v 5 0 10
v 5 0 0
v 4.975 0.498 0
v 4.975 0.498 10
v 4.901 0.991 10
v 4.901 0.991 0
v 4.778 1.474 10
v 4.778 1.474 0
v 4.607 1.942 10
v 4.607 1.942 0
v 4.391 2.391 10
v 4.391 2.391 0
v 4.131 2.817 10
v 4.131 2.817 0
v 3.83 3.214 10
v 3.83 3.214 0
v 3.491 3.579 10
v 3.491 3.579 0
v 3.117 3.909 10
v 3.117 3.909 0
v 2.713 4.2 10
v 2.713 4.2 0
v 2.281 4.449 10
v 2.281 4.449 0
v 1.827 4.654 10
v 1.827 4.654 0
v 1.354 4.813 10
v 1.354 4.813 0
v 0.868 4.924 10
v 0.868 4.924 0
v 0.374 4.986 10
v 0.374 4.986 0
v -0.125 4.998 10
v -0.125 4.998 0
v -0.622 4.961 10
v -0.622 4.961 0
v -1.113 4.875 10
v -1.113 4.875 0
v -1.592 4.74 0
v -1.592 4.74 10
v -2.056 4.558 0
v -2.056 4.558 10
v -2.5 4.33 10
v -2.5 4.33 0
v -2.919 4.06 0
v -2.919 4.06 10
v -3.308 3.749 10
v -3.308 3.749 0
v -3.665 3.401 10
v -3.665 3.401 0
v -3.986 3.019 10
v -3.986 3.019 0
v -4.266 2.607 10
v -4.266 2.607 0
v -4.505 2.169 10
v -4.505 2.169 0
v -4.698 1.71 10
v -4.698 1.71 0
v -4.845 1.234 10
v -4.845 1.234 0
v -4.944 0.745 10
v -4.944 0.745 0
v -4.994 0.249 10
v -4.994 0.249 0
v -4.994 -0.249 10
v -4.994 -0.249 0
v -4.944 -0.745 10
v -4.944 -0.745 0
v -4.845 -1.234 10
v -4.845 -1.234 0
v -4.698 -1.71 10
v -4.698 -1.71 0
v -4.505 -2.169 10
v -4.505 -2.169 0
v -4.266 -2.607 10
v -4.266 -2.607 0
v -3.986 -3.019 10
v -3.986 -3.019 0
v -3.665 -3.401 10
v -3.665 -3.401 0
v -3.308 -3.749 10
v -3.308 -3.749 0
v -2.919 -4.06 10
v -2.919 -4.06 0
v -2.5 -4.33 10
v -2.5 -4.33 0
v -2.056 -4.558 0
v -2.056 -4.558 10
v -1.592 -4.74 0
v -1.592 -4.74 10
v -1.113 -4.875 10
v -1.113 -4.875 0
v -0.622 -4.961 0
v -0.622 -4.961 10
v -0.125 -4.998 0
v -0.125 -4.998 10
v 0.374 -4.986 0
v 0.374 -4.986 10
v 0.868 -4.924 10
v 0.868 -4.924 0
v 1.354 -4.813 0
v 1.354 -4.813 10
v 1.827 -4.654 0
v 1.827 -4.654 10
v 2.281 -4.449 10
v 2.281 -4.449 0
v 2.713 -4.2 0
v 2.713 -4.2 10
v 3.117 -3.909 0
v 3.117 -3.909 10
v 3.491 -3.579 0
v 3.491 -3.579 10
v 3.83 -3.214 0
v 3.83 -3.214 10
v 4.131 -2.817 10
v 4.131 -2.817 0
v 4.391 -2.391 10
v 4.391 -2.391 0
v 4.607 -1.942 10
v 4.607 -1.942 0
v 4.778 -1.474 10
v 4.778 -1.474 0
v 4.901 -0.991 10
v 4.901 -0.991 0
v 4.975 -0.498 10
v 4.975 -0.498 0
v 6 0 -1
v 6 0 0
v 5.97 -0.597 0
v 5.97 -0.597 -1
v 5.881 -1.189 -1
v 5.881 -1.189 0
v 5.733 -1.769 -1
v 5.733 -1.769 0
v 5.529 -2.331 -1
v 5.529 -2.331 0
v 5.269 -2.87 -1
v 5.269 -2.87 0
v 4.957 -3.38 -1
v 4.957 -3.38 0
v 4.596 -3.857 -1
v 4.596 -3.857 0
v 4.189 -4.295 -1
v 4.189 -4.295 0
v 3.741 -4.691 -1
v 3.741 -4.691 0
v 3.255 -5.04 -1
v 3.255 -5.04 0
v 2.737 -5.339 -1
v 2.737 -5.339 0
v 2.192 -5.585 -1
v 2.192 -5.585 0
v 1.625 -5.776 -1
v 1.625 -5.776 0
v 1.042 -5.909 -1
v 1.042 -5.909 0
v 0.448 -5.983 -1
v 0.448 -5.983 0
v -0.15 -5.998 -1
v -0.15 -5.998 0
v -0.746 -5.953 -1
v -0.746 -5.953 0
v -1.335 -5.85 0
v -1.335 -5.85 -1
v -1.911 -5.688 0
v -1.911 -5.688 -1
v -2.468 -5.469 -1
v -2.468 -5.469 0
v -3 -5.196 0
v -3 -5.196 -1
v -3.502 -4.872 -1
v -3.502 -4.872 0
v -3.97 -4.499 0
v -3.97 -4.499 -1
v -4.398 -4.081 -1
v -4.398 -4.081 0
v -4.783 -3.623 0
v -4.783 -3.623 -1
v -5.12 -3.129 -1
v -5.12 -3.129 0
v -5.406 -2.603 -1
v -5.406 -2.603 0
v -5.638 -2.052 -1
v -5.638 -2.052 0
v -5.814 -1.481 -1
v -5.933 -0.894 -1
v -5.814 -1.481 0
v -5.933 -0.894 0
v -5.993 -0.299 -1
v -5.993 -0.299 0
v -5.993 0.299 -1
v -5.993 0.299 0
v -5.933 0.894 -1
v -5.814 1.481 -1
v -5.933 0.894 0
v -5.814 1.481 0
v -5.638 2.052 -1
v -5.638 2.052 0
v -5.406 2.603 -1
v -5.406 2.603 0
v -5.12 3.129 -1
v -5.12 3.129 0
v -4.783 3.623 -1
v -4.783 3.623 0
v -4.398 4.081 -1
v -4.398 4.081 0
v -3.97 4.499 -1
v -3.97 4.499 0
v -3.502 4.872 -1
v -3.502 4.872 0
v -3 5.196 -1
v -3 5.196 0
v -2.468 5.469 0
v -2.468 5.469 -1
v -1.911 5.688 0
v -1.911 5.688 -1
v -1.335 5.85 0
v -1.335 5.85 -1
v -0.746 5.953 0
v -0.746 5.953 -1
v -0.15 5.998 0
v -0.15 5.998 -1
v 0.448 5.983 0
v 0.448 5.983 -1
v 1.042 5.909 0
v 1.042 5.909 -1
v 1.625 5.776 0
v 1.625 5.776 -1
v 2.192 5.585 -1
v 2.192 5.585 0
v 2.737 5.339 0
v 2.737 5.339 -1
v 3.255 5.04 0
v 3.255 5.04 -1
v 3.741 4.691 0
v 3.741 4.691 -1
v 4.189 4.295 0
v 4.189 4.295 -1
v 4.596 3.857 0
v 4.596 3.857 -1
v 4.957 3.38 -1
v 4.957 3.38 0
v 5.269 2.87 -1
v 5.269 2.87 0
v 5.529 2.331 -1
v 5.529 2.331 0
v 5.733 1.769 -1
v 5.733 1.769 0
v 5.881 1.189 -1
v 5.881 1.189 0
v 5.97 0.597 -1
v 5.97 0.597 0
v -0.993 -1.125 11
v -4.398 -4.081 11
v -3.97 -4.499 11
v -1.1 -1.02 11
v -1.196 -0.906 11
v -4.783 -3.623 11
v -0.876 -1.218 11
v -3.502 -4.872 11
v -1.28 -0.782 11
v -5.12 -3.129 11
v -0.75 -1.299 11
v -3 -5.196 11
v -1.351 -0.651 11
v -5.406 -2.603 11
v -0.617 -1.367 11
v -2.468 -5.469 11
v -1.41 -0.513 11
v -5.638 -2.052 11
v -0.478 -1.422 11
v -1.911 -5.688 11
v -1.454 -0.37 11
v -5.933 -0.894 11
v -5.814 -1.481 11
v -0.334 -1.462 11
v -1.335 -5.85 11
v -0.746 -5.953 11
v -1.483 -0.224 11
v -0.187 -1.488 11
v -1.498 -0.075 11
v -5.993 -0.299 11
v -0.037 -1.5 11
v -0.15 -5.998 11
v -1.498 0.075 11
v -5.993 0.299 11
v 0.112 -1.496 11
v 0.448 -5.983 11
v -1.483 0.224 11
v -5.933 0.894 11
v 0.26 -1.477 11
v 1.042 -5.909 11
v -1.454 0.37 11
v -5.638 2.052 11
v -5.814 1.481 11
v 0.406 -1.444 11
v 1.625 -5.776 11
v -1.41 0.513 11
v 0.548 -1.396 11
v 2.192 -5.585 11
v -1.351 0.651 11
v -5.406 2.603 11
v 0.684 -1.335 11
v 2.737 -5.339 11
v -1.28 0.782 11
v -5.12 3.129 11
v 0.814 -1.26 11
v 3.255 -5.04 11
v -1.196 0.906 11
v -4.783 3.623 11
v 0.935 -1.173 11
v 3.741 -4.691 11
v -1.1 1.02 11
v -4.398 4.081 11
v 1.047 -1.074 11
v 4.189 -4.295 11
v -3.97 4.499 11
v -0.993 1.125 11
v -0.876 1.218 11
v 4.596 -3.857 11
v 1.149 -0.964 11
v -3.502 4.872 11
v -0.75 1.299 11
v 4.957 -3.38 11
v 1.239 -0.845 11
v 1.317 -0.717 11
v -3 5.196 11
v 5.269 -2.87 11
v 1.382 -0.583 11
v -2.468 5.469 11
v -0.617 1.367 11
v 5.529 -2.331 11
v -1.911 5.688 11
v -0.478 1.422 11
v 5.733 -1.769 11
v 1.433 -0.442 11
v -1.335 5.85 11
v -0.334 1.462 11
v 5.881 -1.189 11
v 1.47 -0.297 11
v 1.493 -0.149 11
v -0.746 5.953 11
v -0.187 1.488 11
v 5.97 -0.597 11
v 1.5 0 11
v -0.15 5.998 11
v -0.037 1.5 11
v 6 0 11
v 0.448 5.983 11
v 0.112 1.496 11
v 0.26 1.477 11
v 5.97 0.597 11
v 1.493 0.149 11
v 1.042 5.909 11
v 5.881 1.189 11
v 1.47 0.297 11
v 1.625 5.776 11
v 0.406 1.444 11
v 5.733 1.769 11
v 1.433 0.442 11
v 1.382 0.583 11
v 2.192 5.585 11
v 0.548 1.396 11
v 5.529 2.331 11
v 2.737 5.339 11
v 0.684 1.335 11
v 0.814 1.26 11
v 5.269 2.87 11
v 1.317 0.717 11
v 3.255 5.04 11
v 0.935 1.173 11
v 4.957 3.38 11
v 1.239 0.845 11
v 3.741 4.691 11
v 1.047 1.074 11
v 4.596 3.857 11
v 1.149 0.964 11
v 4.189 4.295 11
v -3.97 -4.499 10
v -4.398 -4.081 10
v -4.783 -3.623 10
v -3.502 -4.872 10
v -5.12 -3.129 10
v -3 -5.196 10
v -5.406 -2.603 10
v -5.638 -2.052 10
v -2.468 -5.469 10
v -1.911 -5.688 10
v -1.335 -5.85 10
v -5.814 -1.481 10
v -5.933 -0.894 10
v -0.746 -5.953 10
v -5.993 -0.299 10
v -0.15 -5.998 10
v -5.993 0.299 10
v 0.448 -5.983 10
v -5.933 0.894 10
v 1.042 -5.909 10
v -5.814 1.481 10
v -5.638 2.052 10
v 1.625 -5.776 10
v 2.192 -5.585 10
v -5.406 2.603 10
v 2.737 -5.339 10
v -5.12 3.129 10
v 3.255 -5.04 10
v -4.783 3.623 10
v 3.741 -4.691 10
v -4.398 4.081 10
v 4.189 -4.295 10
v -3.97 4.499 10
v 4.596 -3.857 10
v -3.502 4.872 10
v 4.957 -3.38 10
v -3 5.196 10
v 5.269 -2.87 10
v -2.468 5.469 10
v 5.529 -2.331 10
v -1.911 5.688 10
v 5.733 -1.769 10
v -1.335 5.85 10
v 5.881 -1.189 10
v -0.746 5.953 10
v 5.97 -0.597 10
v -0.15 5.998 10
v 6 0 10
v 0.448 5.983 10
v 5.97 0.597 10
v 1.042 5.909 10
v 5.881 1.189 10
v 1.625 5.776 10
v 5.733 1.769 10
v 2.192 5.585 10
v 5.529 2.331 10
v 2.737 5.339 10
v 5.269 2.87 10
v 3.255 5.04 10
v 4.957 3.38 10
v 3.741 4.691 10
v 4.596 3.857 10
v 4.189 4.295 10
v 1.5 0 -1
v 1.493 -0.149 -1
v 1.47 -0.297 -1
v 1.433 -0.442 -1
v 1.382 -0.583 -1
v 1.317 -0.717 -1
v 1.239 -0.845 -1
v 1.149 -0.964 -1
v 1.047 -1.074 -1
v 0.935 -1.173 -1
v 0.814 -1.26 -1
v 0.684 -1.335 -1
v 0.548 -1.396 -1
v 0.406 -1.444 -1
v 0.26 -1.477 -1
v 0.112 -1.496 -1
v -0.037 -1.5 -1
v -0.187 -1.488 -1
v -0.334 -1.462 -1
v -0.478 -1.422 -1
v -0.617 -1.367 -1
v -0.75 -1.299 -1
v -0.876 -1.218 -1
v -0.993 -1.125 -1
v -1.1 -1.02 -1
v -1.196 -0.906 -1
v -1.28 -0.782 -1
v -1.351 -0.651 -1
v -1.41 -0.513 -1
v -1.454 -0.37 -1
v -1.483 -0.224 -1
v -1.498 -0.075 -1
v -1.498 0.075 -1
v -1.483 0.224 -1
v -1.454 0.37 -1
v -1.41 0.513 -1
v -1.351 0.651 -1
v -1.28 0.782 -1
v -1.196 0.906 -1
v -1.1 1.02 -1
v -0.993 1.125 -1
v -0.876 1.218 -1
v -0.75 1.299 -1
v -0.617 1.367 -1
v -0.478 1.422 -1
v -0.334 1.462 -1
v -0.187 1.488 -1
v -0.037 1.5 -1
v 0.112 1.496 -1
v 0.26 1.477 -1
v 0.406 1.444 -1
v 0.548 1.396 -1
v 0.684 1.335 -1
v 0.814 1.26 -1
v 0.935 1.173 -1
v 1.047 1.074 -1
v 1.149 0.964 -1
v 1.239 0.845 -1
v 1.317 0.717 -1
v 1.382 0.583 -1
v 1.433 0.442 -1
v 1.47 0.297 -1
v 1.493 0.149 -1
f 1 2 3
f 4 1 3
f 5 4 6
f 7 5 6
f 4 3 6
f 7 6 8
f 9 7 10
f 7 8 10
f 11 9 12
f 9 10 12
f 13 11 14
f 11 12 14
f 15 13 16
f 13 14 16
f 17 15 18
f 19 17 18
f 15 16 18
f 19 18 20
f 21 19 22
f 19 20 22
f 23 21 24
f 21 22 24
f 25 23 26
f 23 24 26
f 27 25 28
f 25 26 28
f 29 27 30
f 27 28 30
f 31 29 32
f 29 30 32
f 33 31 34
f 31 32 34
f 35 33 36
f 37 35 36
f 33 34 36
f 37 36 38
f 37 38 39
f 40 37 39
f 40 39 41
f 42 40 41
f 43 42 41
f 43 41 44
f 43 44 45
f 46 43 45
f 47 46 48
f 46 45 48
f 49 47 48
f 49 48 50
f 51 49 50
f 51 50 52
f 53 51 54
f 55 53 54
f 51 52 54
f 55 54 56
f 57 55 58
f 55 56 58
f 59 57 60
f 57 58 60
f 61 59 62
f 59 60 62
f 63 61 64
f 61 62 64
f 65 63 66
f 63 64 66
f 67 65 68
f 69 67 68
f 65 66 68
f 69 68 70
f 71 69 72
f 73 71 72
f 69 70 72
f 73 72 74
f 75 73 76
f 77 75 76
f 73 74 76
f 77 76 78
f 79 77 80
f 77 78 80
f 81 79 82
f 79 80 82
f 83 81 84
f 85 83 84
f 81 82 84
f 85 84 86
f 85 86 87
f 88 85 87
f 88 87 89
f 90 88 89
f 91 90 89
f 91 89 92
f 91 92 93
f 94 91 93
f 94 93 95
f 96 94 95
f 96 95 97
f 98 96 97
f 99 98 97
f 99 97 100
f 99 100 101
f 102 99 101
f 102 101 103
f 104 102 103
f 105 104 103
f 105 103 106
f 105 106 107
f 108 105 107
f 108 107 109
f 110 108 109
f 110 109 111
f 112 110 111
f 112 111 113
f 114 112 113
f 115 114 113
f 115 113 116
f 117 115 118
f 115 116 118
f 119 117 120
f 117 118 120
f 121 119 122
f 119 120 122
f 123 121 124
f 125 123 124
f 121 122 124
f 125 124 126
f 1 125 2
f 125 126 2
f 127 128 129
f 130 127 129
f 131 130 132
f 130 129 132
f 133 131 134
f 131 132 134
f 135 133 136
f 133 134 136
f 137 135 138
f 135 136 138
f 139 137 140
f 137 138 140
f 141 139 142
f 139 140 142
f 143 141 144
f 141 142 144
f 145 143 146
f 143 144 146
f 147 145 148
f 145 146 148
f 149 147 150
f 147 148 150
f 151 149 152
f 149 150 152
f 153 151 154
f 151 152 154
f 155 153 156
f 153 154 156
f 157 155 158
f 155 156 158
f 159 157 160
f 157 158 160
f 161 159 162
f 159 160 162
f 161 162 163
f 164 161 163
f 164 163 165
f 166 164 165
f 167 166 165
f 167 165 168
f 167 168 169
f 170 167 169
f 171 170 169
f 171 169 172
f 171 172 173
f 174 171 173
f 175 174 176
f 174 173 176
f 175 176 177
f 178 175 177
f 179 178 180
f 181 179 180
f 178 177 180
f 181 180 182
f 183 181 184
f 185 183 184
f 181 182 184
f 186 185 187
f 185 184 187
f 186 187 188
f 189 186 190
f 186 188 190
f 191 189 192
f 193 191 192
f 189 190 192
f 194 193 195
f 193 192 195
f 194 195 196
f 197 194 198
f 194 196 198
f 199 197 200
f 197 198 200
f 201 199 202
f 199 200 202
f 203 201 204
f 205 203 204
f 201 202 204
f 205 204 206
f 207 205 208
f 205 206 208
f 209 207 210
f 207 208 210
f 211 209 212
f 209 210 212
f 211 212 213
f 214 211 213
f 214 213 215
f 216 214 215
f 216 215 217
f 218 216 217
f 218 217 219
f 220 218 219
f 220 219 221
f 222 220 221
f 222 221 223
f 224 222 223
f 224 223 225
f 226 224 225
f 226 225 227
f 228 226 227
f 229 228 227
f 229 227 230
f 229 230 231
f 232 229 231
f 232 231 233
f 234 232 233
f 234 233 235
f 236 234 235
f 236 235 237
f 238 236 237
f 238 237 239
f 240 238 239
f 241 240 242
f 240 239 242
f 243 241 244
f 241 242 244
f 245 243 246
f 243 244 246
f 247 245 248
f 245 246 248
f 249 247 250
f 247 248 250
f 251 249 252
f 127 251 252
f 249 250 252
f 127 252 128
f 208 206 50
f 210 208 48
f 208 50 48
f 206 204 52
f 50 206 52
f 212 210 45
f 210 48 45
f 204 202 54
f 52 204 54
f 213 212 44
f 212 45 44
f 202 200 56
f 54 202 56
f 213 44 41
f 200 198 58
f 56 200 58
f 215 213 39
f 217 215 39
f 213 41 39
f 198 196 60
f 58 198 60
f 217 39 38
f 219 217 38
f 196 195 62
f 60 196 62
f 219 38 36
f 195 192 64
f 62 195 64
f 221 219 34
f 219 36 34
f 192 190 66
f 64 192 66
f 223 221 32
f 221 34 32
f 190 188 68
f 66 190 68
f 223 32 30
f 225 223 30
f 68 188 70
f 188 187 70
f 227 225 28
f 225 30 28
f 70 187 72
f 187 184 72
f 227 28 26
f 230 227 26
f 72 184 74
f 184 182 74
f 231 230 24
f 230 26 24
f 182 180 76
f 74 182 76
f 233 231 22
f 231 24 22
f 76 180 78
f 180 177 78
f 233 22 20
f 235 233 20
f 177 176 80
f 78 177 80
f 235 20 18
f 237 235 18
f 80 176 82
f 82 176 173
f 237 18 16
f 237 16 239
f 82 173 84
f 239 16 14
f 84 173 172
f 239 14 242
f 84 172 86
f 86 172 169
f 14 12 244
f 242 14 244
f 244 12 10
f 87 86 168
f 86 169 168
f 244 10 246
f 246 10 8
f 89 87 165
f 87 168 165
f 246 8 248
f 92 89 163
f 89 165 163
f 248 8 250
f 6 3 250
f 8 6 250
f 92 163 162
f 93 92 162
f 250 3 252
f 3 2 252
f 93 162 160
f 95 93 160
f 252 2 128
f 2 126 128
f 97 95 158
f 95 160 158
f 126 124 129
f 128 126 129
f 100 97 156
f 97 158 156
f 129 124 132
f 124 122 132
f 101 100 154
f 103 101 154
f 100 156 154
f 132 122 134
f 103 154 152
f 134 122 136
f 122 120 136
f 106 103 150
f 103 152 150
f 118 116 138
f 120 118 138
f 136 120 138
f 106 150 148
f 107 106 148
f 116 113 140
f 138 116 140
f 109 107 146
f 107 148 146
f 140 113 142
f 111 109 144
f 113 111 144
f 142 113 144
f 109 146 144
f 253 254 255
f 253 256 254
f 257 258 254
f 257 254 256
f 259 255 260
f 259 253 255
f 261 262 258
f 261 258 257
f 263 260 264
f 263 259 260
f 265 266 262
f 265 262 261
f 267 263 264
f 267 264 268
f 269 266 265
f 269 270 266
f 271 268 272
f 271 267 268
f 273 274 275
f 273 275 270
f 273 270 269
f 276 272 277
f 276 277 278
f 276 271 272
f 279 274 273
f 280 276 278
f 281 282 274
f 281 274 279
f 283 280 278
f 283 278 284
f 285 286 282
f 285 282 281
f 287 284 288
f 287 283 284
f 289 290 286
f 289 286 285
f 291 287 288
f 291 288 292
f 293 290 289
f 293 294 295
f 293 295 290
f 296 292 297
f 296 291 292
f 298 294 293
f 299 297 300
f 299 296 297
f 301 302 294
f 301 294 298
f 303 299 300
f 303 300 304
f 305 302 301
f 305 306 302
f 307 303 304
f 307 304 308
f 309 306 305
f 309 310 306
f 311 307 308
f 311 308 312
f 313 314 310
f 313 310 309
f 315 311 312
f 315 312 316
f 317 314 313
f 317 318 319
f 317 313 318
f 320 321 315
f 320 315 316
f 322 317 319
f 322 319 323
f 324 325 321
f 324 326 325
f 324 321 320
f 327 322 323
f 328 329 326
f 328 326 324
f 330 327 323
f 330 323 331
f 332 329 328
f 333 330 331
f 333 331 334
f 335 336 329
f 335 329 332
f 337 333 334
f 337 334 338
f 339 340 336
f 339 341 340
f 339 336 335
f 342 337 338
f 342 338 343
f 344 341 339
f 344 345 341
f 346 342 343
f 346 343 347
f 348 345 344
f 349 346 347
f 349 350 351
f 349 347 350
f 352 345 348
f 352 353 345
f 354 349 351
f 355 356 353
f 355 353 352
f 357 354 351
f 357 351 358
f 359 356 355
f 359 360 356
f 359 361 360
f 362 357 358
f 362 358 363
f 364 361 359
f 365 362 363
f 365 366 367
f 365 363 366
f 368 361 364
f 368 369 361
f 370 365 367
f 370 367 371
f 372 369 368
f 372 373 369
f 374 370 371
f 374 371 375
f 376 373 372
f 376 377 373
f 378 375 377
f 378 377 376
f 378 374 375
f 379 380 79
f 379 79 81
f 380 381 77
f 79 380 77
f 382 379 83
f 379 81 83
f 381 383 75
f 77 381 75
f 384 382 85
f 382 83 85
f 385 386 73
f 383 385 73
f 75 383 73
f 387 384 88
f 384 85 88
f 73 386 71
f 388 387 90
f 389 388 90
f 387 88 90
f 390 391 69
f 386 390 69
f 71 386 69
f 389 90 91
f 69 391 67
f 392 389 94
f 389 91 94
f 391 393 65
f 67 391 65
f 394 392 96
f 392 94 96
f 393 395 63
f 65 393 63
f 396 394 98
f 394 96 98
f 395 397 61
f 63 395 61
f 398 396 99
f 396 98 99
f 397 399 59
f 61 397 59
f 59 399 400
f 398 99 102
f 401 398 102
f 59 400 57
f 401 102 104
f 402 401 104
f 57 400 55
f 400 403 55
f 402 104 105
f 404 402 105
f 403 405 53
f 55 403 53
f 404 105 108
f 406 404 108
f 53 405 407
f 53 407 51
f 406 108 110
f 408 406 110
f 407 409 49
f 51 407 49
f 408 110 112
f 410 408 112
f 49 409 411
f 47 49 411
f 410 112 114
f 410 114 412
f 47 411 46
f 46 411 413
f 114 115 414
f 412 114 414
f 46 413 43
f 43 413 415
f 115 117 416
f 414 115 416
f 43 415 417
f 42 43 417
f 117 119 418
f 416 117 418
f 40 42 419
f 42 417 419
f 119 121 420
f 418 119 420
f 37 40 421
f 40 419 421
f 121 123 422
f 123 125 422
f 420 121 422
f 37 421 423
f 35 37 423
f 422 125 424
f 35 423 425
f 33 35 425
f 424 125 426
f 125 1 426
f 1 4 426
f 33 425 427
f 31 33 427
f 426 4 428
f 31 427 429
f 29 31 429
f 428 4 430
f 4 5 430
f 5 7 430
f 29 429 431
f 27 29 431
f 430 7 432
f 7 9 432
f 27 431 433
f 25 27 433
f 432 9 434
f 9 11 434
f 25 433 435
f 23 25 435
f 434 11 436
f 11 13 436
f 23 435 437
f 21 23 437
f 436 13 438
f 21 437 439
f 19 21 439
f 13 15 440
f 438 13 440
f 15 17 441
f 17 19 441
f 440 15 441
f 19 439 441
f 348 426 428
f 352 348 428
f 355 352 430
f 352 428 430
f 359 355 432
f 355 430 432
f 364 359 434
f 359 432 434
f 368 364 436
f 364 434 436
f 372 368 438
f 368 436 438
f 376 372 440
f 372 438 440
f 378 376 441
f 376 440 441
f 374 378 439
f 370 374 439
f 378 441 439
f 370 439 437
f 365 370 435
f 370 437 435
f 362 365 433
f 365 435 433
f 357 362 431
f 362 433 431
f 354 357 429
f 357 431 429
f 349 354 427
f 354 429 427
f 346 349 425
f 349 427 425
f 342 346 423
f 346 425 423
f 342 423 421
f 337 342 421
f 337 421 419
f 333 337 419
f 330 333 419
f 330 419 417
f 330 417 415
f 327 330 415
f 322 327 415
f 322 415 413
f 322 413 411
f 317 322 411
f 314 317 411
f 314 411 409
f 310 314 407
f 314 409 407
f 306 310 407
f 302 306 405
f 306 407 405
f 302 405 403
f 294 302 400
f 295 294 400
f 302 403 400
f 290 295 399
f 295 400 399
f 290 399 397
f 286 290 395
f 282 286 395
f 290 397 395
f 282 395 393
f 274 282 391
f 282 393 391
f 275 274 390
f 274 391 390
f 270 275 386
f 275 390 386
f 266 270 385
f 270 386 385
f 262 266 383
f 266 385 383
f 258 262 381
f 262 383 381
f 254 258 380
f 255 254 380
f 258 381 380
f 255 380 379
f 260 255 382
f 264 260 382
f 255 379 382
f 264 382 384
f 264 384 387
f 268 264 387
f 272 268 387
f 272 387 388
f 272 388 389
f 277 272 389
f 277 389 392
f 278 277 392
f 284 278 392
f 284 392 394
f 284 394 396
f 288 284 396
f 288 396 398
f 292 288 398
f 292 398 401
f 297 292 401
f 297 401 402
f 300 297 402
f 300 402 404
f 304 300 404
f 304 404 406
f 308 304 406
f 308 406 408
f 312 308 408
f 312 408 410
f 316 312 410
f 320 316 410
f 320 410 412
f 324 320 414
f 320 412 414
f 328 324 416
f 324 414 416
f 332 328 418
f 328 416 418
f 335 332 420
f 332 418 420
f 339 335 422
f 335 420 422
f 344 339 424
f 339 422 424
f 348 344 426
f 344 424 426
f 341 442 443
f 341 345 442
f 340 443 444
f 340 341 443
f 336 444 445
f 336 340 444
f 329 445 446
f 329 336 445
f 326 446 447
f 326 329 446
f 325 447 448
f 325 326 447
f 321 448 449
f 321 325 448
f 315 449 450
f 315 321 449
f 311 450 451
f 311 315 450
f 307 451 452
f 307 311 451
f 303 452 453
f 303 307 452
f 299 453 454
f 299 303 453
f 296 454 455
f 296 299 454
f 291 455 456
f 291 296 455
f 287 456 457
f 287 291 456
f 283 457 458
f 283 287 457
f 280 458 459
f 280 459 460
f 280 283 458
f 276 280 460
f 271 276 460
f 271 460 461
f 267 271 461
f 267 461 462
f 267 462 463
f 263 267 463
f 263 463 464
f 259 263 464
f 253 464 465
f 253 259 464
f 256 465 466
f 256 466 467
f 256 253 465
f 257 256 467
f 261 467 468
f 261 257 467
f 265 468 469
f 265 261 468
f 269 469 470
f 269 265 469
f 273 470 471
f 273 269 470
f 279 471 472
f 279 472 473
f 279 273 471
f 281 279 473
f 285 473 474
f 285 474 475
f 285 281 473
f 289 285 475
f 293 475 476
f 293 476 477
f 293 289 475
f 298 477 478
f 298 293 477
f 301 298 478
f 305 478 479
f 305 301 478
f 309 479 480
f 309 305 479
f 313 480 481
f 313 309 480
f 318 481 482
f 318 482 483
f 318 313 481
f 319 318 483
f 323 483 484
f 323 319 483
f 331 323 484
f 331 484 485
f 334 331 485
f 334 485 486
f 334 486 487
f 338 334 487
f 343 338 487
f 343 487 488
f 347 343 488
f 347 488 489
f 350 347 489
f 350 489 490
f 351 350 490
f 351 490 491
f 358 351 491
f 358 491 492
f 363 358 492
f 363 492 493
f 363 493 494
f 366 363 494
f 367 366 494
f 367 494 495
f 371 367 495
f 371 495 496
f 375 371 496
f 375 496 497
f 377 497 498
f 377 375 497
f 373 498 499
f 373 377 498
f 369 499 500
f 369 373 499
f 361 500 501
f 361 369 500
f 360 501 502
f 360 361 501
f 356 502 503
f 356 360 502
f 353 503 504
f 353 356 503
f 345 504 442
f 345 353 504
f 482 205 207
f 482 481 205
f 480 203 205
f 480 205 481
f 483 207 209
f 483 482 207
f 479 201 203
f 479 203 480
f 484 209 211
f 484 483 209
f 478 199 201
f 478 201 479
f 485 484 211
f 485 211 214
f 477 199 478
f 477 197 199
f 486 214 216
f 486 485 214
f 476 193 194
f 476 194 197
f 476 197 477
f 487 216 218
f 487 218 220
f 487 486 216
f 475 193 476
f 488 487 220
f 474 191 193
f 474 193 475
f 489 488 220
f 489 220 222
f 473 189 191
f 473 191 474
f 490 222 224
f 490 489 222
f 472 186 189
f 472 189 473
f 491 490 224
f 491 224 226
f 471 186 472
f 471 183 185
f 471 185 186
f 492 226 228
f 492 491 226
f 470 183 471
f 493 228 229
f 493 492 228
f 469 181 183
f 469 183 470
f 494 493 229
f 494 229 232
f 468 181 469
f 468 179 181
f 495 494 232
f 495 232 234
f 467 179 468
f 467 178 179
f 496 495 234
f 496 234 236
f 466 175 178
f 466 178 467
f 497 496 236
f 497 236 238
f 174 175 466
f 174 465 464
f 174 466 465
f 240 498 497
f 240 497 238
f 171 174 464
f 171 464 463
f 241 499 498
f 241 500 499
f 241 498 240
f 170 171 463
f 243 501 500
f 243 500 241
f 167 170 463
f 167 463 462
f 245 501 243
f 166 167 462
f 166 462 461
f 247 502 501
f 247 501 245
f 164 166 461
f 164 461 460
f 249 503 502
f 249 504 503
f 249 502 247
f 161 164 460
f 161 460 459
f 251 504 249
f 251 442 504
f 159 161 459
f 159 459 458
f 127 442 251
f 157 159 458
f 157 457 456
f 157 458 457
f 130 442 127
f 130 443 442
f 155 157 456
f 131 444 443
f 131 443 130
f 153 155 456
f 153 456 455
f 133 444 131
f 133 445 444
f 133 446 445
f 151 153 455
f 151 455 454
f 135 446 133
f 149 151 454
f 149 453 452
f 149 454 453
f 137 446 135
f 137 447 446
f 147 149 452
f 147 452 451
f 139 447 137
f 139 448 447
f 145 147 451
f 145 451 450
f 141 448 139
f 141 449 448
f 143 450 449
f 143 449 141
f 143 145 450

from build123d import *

# Parameters (mm, degrees)
SKETCH_R      = 5
SKETCH_R_2    = 1.5
PAD_DEPTH     = 10
SKETCH001_R   = 6
SKETCH001_R_2 = 1.5
PAD001_DEPTH  = 1
SKETCH002_R   = 6
SKETCH002_R_2 = 1.5
PAD002_DEPTH  = 1


with BuildPart() as part:
    # Sketch → Pad (new body)
    with BuildSketch(Plane.XY):
        Circle(SKETCH_R)
        Circle(SKETCH_R_2, mode=Mode.SUBTRACT)
    extrude(amount=PAD_DEPTH)

    # Sketch001 (on Face4 of Pad) → Pad001 (join)
    with BuildSketch(Plane.XY.offset(10)):
        Circle(SKETCH001_R)
        Circle(SKETCH001_R_2, mode=Mode.SUBTRACT)
    extrude(amount=PAD001_DEPTH)

    # Sketch002 (on Face2 of Pad001) → Pad002 (join)
    with BuildSketch(Plane(origin=(0, 0, 0), x_dir=(1, 0, 0), z_dir=(0, 0, -1))):
        Circle(SKETCH002_R)
        Circle(SKETCH002_R_2, mode=Mode.SUBTRACT)
    extrude(amount=PAD002_DEPTH)


solid = part.part
